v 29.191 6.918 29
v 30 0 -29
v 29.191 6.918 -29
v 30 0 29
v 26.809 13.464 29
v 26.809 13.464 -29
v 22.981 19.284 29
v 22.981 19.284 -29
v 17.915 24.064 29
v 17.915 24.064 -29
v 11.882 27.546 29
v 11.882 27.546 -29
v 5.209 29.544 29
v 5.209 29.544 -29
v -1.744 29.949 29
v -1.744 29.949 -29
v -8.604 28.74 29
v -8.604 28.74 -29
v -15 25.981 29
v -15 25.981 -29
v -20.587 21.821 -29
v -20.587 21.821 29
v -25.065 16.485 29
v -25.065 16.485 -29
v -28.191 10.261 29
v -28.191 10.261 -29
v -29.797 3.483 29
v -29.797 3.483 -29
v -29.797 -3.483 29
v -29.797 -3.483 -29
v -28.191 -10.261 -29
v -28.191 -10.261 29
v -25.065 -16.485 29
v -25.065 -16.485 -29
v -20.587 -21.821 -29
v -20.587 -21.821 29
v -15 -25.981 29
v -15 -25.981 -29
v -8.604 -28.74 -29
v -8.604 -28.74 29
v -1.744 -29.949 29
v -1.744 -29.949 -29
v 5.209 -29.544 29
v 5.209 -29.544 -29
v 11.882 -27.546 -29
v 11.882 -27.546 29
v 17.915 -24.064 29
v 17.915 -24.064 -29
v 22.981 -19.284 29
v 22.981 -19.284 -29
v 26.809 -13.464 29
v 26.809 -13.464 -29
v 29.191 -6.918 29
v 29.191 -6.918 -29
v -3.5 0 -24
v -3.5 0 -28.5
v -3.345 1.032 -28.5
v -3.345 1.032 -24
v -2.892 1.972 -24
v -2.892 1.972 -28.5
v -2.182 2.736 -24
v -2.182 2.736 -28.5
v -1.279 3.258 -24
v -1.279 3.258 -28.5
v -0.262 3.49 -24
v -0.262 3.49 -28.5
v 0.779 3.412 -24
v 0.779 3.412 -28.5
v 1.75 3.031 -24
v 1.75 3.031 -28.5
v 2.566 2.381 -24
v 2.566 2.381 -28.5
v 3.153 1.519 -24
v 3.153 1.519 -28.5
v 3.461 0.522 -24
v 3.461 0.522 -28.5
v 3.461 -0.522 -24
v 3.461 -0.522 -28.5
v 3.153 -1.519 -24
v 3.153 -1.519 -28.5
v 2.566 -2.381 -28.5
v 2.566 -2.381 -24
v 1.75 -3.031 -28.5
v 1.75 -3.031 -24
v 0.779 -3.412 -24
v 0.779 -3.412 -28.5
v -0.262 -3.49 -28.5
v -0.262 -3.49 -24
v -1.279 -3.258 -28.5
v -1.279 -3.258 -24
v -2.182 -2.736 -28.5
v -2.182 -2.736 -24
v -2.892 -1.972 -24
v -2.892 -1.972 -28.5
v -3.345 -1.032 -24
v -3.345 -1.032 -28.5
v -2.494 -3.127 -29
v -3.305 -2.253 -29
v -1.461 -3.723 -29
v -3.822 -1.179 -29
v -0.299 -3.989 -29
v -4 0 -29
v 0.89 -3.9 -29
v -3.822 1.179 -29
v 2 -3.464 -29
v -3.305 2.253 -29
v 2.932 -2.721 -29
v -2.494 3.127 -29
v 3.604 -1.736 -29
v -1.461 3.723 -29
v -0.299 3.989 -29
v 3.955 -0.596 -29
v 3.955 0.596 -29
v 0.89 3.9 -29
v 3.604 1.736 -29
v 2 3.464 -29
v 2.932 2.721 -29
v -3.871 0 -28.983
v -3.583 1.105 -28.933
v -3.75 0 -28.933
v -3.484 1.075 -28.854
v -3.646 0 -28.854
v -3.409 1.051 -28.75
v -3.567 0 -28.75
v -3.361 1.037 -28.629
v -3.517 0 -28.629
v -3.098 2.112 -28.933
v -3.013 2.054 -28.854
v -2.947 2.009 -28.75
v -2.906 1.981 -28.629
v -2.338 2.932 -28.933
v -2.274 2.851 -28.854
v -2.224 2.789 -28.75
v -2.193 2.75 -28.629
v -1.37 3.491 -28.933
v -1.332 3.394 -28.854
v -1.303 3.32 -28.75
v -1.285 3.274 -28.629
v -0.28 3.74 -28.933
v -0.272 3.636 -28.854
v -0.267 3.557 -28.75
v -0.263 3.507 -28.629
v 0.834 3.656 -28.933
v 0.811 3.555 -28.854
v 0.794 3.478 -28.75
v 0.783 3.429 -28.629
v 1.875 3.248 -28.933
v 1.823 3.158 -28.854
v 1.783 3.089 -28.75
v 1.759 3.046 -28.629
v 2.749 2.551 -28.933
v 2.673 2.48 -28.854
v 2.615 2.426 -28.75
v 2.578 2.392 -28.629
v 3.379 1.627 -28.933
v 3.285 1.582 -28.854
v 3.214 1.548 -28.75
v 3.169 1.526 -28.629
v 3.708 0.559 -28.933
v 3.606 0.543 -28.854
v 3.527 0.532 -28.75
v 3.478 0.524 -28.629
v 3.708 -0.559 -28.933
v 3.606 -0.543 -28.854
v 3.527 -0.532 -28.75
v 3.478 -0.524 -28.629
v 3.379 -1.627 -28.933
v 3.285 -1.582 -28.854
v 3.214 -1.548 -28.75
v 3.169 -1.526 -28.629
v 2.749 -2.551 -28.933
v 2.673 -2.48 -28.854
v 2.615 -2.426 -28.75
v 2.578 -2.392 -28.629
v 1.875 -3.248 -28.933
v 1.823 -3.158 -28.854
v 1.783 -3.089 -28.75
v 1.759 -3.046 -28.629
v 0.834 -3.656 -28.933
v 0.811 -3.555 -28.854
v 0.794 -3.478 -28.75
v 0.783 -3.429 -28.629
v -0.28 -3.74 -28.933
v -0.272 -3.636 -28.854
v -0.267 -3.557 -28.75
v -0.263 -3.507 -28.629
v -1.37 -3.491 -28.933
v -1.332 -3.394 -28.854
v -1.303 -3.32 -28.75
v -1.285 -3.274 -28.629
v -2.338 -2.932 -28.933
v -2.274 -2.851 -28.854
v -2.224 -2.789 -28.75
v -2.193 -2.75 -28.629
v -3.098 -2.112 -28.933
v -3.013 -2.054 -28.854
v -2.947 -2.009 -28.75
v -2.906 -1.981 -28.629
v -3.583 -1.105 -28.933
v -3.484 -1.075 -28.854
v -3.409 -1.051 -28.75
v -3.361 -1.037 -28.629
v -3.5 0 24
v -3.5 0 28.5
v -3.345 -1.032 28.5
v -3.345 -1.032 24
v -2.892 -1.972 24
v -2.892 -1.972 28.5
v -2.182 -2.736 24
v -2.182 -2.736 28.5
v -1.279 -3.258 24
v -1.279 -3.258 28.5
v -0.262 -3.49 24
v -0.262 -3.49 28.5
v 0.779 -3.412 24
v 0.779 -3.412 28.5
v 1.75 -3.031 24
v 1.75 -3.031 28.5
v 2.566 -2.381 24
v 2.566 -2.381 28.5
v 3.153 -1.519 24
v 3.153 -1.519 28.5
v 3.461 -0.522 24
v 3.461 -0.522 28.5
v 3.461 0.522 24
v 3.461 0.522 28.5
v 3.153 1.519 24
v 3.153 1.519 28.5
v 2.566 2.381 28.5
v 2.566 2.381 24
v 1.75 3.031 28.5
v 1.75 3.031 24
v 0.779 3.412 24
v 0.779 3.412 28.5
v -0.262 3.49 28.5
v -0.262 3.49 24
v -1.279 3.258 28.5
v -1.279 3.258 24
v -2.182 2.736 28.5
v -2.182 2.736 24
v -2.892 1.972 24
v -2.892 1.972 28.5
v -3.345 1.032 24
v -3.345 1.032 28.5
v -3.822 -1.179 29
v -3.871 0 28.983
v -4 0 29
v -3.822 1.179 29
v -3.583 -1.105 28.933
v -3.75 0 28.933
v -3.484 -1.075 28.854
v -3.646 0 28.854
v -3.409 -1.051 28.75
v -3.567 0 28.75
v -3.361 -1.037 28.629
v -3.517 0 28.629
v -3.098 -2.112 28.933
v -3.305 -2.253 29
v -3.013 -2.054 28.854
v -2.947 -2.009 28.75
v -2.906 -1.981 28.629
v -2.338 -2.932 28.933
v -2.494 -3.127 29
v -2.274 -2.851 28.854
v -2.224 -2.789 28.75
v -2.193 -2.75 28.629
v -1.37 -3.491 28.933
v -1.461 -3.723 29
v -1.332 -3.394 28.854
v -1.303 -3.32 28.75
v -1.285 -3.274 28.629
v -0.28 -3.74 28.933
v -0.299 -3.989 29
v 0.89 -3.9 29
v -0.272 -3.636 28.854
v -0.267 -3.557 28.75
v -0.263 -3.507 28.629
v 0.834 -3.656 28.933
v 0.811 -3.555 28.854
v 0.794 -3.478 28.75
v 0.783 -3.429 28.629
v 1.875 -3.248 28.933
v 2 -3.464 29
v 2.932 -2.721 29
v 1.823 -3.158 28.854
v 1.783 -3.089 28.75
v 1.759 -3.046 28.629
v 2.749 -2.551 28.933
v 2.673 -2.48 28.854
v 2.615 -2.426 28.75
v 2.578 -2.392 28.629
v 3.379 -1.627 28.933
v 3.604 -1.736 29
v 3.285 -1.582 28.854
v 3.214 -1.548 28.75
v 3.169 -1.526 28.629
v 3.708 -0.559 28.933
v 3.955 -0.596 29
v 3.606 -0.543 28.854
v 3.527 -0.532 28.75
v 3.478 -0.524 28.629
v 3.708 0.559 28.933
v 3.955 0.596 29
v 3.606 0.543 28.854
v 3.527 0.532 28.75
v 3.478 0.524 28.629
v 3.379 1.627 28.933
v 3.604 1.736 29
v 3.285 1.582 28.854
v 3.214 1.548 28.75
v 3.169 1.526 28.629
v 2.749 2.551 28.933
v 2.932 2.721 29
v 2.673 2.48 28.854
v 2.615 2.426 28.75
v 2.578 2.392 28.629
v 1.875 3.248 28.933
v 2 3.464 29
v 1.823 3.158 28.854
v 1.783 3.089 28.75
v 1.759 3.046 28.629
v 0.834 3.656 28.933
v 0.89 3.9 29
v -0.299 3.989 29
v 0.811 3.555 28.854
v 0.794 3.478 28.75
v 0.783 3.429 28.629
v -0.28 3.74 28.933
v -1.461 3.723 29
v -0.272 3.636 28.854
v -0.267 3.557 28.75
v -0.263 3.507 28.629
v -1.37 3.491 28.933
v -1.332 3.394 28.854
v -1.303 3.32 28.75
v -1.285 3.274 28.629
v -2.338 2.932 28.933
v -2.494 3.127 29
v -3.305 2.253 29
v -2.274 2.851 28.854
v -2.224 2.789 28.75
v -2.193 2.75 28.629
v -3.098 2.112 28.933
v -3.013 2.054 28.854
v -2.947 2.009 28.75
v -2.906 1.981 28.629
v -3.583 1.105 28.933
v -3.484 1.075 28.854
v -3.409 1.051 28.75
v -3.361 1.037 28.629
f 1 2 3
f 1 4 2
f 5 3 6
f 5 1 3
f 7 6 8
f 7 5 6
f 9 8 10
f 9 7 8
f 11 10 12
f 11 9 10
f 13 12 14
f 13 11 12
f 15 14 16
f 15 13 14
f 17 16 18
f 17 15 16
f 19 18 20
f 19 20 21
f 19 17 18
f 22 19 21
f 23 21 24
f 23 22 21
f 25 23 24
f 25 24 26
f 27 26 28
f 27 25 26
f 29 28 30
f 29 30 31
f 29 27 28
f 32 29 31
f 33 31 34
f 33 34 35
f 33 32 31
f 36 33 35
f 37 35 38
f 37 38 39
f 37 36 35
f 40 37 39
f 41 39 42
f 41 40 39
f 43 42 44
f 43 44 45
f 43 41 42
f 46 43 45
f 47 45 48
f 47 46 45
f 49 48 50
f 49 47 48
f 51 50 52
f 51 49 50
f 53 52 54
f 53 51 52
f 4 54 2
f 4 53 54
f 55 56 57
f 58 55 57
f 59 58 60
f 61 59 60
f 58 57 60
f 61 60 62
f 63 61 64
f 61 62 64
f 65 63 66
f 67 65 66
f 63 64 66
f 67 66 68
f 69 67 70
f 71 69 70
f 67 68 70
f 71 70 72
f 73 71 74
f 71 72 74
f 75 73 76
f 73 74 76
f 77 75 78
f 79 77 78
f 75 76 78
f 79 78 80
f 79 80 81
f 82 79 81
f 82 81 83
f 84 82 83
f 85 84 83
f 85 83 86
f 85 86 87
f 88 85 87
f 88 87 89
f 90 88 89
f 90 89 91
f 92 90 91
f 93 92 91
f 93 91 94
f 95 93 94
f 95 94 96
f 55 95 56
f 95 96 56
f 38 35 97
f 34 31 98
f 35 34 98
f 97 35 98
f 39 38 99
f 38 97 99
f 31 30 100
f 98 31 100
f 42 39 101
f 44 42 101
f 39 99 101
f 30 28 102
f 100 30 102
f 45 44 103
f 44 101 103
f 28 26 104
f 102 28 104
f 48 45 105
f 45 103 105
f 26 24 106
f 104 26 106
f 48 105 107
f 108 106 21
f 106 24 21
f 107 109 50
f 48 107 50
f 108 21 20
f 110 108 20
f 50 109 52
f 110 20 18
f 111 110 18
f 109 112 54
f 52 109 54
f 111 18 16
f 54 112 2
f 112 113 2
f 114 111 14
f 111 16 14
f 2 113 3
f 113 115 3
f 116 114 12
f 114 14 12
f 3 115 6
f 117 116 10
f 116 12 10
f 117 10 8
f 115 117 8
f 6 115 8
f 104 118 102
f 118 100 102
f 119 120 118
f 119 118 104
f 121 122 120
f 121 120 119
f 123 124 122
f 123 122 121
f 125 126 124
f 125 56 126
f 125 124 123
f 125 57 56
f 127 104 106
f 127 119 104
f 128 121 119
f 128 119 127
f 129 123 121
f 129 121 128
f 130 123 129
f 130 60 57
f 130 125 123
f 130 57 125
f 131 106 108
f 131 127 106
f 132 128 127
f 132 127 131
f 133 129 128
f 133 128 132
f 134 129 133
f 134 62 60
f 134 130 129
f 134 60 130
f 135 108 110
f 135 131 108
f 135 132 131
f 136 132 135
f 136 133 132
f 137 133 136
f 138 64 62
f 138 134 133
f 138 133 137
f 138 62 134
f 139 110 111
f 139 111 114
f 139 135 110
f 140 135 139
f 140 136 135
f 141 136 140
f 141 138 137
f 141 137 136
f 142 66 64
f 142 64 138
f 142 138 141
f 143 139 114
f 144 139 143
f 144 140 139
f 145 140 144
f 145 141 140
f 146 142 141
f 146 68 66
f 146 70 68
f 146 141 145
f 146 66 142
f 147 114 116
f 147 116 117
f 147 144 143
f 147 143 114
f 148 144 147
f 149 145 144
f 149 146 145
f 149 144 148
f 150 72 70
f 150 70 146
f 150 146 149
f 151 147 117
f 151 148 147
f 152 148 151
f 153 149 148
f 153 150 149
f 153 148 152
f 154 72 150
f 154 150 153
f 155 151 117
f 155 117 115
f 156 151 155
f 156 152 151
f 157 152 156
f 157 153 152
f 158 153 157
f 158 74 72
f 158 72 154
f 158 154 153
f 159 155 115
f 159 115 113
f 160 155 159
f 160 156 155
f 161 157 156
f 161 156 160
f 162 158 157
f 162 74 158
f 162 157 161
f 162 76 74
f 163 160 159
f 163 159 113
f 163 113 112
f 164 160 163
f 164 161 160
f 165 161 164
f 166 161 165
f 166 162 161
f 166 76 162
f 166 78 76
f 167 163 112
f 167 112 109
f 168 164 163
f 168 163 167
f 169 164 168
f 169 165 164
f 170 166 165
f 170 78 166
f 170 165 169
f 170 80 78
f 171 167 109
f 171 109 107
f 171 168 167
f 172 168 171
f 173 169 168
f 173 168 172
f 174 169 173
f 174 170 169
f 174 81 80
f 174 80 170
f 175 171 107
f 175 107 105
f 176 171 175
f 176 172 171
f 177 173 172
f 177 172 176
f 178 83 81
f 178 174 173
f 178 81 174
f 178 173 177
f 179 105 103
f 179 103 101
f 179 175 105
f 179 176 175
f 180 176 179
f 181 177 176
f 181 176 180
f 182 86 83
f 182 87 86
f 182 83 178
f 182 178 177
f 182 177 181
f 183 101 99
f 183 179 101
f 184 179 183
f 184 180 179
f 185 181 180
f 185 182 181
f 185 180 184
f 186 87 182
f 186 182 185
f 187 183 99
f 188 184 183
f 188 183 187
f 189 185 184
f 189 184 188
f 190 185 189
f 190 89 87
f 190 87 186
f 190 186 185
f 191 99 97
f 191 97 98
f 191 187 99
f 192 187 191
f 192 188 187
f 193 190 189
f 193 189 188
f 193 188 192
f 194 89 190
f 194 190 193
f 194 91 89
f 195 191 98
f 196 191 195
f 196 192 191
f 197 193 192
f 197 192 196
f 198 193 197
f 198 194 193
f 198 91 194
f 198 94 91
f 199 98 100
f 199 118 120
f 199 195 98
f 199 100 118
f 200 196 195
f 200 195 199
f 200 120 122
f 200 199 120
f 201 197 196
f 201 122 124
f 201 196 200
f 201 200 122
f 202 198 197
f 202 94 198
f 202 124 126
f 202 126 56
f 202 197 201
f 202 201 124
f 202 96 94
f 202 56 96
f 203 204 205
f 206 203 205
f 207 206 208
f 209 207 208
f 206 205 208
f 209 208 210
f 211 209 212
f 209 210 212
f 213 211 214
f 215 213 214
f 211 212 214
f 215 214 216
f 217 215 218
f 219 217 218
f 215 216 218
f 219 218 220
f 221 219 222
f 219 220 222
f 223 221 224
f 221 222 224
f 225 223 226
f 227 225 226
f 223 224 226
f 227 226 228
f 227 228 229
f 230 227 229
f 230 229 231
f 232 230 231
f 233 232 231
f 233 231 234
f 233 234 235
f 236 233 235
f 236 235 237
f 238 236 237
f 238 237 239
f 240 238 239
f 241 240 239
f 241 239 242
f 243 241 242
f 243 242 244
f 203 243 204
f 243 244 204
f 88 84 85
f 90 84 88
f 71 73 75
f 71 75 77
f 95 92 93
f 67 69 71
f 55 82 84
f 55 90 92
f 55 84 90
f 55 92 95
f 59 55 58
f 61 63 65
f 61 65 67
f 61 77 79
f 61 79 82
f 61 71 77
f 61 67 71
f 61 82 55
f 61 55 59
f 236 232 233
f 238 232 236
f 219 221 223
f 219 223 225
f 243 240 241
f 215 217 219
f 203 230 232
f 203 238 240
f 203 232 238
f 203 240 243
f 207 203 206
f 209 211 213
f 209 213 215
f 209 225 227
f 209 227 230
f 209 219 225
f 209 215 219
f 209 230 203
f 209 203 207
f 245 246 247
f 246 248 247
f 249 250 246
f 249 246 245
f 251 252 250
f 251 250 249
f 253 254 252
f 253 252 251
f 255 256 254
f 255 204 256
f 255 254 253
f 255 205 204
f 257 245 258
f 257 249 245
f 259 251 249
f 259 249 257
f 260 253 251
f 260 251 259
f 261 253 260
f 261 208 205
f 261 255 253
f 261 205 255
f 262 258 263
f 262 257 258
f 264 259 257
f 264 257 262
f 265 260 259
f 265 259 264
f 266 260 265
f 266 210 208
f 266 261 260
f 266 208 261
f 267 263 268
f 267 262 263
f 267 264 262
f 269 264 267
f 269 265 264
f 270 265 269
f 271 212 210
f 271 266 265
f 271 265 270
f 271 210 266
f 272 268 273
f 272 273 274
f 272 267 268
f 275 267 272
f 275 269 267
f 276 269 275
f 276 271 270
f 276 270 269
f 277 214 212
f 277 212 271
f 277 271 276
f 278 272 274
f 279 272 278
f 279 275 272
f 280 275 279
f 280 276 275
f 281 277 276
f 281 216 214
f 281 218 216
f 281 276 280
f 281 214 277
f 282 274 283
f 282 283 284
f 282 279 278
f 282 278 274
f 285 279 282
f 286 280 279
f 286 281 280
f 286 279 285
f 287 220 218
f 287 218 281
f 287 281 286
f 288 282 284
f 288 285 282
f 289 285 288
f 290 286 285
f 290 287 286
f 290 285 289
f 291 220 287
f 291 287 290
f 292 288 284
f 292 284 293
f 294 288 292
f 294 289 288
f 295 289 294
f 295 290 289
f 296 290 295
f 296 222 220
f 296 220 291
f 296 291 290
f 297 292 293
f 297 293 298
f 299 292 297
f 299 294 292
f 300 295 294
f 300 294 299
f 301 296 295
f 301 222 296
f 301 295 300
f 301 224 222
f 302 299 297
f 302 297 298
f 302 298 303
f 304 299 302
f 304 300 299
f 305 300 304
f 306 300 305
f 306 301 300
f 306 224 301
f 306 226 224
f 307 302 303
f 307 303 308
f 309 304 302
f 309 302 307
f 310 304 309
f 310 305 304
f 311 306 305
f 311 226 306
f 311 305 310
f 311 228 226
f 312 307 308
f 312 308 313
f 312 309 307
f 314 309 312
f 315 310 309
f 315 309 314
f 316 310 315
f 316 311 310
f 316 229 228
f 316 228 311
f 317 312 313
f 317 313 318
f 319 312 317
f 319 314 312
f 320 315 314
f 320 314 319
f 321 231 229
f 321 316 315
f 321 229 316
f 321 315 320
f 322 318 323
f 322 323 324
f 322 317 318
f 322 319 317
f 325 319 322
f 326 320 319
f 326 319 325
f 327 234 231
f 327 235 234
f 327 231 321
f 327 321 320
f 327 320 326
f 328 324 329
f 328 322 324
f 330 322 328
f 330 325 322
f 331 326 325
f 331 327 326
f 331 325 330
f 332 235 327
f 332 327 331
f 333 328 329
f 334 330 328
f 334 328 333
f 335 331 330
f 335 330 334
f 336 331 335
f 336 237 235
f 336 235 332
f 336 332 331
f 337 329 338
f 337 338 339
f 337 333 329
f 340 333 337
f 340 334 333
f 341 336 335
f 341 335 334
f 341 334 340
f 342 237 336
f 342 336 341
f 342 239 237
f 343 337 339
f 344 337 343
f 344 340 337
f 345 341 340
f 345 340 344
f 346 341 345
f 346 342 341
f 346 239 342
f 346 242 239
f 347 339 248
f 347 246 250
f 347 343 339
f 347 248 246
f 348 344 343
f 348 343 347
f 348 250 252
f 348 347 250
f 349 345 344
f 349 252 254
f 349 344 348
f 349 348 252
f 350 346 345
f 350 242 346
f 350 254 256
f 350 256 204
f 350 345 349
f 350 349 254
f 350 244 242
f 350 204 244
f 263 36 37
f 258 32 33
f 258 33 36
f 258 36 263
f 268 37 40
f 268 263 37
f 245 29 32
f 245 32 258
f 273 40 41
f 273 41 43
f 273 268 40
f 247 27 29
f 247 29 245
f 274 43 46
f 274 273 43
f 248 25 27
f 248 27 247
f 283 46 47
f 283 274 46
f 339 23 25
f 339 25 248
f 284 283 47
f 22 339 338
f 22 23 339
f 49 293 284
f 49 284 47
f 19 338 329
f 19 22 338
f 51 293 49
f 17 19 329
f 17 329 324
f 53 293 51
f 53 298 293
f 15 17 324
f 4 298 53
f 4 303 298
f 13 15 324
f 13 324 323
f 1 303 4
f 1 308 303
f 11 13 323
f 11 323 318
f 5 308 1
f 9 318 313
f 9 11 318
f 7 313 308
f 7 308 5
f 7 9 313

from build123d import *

# Parameters (mm, degrees)
SKETCH21_R           = 30
BOSS_EXTRUDE14_DEPTH = 29
SKETCH24_R           = 3.5
CUT_EXTRUDE1_DEPTH   = 5
SKETCH25_R           = 3.5
CUT_EXTRUDE2_DEPTH   = 5
FILLET1_R            = 0.5


with BuildPart() as part:
    # Sketch21 → Boss-Extrude14 (new body, symmetric)
    with BuildSketch(Plane.XY):
        Circle(SKETCH21_R)
    extrude(amount=BOSS_EXTRUDE14_DEPTH, both=True)

    # Sketch24 → Cut-Extrude1 (cut)
    with BuildSketch(Plane(origin=(0, 0, -29), x_dir=(-1, 0, 0), z_dir=(0, 0, -1))):
        Circle(SKETCH24_R)
    extrude(amount=-CUT_EXTRUDE1_DEPTH, mode=Mode.SUBTRACT)

    # Sketch25 → Cut-Extrude2 (cut)
    with BuildSketch(Plane.XY.offset(29)):
        with Locations(Location((0, 0, 0), (0, 0, 180))):  # turned: the seam where the file's is
            Circle(SKETCH25_R)
    extrude(amount=-CUT_EXTRUDE2_DEPTH, mode=Mode.SUBTRACT)

    # Fillet1
    fillet1_edges = [part.edges().sort_by_distance(p)[0] for p in [
        (3.5, 0, 29),
        (3.5, 0, -29),
    ]]
    fillet(fillet1_edges, radius=FILLET1_R)


solid = part.part
